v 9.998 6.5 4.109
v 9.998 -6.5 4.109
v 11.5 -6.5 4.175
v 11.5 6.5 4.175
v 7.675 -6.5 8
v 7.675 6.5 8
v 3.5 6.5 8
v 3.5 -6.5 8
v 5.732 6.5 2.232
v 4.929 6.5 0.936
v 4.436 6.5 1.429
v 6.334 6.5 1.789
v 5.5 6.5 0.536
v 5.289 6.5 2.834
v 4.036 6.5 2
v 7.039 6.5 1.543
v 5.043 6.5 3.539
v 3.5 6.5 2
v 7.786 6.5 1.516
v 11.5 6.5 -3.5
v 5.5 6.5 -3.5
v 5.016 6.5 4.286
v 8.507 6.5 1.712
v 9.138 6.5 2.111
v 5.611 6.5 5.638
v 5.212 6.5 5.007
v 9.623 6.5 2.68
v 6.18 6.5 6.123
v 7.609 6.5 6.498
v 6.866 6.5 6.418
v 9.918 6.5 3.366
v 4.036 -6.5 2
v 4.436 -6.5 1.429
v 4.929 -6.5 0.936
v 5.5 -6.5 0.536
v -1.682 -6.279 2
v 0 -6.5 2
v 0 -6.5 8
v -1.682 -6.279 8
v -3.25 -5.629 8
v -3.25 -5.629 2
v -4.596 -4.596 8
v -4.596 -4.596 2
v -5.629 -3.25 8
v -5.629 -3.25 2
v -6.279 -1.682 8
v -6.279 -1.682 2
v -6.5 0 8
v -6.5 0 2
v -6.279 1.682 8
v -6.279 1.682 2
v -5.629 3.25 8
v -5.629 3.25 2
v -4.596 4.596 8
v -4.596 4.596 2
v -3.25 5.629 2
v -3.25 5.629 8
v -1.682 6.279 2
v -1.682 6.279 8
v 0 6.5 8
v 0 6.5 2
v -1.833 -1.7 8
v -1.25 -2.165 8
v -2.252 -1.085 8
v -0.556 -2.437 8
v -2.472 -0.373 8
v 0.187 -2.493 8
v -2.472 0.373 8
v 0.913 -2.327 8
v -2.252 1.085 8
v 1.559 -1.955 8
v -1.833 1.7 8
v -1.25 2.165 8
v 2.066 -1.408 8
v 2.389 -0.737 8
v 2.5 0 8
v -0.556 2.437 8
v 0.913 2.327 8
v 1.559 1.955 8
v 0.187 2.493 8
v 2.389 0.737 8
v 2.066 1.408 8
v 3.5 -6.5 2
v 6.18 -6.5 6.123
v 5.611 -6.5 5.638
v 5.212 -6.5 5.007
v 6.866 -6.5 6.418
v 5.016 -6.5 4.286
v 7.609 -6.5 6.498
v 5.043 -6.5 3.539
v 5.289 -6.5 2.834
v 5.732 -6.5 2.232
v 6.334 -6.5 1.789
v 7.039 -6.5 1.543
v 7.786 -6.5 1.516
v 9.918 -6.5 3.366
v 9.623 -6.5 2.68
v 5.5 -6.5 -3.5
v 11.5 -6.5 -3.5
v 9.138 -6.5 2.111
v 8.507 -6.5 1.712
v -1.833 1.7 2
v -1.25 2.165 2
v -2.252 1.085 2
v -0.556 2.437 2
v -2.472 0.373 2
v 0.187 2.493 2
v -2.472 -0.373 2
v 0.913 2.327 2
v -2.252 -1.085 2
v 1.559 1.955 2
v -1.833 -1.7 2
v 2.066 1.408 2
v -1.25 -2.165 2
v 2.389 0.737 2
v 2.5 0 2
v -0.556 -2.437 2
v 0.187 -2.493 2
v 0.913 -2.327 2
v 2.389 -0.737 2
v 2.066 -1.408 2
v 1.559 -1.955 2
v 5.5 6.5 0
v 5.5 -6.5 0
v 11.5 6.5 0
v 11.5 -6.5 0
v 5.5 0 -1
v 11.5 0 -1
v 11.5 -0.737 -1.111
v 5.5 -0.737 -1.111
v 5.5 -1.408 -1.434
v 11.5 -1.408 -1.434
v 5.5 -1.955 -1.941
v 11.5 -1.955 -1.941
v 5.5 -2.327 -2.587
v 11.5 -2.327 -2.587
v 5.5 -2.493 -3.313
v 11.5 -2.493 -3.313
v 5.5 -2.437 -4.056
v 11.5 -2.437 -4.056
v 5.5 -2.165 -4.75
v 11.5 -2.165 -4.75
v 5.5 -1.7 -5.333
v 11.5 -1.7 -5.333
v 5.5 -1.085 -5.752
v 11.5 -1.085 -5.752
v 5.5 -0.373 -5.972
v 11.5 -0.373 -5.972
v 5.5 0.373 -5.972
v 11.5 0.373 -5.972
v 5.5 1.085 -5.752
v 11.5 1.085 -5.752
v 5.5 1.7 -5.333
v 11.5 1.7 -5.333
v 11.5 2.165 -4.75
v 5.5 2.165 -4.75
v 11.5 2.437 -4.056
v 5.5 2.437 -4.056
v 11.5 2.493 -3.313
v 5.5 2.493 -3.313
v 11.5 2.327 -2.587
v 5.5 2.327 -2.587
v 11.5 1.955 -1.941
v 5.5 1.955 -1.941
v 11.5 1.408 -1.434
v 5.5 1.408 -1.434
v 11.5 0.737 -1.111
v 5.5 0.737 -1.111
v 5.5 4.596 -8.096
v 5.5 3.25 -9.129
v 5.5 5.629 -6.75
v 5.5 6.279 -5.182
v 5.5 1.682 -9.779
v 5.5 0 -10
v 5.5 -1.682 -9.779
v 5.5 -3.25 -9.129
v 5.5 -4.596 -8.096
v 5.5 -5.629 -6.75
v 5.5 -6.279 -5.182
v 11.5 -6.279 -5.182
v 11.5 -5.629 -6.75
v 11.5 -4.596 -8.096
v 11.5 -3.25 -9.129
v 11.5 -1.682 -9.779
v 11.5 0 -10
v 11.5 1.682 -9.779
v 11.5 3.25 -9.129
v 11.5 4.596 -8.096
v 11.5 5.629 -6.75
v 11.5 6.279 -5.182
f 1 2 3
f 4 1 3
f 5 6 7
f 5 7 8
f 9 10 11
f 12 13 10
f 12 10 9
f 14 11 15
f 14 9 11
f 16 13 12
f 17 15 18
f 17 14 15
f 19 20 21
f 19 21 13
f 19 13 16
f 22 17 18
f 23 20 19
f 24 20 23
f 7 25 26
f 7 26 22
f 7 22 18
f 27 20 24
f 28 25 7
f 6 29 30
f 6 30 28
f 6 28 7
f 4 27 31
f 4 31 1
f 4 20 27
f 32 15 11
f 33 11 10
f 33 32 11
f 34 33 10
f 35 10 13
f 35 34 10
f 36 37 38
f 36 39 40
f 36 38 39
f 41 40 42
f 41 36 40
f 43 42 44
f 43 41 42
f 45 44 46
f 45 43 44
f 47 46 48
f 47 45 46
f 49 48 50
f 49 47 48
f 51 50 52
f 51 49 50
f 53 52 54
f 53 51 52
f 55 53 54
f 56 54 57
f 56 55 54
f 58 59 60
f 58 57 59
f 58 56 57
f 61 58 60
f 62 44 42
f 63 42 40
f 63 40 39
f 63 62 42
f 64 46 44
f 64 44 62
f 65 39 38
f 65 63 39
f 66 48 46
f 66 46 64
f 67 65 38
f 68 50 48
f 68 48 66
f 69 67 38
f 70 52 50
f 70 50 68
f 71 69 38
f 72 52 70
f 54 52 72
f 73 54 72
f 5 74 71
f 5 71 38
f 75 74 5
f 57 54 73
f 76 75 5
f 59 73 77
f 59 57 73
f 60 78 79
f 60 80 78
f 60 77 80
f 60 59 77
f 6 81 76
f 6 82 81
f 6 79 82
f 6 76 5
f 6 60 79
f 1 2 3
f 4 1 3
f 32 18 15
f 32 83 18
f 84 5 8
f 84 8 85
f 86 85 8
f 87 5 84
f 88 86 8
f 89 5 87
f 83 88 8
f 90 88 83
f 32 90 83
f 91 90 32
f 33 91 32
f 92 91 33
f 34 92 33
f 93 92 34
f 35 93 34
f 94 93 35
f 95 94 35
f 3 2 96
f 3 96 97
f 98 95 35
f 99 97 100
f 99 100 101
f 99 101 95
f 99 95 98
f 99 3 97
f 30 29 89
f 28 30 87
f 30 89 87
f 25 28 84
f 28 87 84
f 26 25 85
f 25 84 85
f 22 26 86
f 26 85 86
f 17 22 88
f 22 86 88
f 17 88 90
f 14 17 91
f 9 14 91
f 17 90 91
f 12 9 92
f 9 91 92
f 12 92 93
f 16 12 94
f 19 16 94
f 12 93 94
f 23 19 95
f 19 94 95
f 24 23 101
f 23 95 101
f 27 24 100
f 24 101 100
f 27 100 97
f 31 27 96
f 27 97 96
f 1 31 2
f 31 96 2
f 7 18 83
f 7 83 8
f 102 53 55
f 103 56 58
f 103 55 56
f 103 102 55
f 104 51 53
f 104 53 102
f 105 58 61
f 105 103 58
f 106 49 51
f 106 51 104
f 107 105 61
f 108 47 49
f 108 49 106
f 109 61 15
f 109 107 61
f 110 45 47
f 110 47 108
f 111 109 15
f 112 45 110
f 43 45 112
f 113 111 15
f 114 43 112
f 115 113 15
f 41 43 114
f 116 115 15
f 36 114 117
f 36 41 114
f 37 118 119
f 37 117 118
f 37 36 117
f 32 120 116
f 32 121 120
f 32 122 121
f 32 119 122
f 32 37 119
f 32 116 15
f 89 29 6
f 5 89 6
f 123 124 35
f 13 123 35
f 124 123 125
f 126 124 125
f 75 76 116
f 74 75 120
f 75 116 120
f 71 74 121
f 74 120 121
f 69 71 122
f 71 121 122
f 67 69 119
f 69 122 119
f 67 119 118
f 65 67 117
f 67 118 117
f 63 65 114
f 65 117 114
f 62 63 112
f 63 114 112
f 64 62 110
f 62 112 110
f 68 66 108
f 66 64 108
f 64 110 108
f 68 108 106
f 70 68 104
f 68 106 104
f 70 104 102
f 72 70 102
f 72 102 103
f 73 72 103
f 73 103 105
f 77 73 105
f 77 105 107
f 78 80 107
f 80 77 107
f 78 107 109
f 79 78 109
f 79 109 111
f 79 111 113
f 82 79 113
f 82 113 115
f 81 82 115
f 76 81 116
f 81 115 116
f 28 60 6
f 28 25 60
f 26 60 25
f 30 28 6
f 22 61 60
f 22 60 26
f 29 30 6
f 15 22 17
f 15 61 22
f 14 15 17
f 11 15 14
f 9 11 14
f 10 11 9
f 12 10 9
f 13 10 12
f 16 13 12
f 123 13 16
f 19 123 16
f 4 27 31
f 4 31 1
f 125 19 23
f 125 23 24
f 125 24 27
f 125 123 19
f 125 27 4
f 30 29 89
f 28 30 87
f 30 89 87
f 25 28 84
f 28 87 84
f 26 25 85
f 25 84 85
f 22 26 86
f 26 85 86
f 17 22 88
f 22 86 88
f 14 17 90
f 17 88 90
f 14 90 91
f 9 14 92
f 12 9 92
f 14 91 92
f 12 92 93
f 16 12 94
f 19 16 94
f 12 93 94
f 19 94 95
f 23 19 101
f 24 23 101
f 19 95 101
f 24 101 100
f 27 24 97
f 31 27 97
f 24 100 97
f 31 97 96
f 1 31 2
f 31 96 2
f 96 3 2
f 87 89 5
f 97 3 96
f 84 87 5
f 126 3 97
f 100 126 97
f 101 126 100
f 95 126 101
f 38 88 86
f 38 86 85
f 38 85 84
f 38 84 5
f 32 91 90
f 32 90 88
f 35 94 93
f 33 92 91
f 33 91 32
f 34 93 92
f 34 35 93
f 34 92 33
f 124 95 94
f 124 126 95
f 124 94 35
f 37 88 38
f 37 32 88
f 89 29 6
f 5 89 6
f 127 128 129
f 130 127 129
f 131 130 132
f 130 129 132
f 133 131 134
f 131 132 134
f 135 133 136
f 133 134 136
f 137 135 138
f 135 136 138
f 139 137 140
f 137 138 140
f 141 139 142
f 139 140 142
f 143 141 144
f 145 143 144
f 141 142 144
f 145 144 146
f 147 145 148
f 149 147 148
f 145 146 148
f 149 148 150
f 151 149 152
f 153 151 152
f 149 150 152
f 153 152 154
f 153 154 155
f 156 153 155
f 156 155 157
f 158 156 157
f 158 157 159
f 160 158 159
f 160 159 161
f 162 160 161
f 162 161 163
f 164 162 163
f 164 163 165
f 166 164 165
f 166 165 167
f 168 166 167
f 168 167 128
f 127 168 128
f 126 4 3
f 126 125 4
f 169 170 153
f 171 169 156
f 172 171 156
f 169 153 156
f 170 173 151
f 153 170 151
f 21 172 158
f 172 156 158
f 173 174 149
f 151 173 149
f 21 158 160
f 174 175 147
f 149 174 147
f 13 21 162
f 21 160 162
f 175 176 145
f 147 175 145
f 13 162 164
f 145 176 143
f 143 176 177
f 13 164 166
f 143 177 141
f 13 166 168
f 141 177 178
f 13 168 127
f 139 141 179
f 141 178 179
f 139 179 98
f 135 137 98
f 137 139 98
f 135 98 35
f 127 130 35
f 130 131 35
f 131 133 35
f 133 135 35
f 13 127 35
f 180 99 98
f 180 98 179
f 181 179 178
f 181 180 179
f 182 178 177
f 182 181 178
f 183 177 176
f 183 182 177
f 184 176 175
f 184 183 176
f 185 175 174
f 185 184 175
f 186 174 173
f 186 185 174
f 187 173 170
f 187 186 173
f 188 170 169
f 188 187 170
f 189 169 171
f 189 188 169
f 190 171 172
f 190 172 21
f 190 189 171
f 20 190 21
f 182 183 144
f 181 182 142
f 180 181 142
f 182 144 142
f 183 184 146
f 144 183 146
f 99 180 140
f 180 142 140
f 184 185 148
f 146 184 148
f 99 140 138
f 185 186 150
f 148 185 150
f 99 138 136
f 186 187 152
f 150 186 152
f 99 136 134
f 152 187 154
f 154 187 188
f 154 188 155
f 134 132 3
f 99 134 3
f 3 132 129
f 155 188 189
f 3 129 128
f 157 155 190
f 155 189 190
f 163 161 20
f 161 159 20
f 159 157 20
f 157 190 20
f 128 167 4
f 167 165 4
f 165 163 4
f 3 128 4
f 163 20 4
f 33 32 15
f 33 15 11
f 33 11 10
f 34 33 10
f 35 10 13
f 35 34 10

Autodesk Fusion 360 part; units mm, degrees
sketch "Esquisse1" plane through (0, 0, 0) normal (0, 0, 1) x (1, 0, 0)
  circle A0 centre (0, 0) radius 2.5
  circle A1 centre (0, 0) radius 6.5
  line L0 (0, 6.5) -> (11.5, 6.5)
  line L1 (11.5, 6.5) -> (11.5, -6.5)
  line L2 (11.5, -6.5) -> (0, -6.5)
  line L3 (0, -6.5) -> (0, 6.5) construction
  dimension "d1" = 5
  dimension "d2" = 4
  dimension "d3" = 13
  dimension "d4" = 11.5
extrude "Extrusion1" add sketch "Esquisse1" along normal blind 8 makes body 1
sketch "Esquisse3" plane through (0, -6.5, 0) normal (0, -1, 0) x (1, 0, 0)
  line L0 (0, 0) -> (11.5, 0)
  line L1 (11.5, 0) -> (11.5, 8)
  line L2 (11.5, 8) -> (0, 8)
  line L3 (0, 8) -> (0, 0)
  circle A0 centre (7.5, 4) radius 4
  dimension "d14" = 8
pattern_circular "Réseau C2" count 2 over 90 about axis through (7.5, -6.5, 4) along (0, -1, 0) of bodies 1 makes body 2
sketch "Esquisse2" plane through (0, -6.5, 0) normal (0, -1, 0) x (1, 0, 0)
  line L0 (0, 0) -> (11.5, 0)
  line L1 (11.5, 0) -> (11.5, 8)
  line L2 (11.5, 8) -> (0, 8)
  line L3 (0, 8) -> (0, 0)
  circle A0 centre (7.5, 4) radius 4
  circle A1 centre (7.5, 4) radius 2.5
  line L4 (0, 0) -> (-6.5, 0)
  line L5 (0, 0) -> (0, 8)
  line L6 (0, 8) -> (-6.5, 8)
  line L7 (0, 8) -> (0, 0)
  line L8 (-6.5, 8) -> (-6.5, 0)
  line L9 (7.5, 4) -> (11.5, 8) construction
  line L10 (7.5, 4) -> (7.6746, 8)
  line L11 (7.5, 4) -> (11.5, 4.1746)
  line L12 (7.5, 4) -> (0, 4) construction
  line L13 (7.5, 8) -> (-6.5, 8)
  line L14 (-6.5, 8) -> (-6.5, 2)
  line L15 (7.5, 2) -> (7.5, 8) construction
  line L16 (11.5, -3.5) -> (11.5, -10)
  line L17 (11.5, -3.5) -> (3.5, -3.5)
  line L18 (3.5, -3.5) -> (3.5, -10)
  line L19 (3.5, -3.5) -> (11.5, -3.5)
  line L20 (11.5, -3.5) -> (11.5, 8)
  line L21 (11.5, 8) -> (3.5, 8)
  line L22 (3.5, 8) -> (3.5, -3.5)
  line L23 (3.5, -3.5) -> (11.5, -3.5)
  line L24 (-6.5, 2) -> (3.5, 2)
  line L25 (3.5, -10) -> (11.5, -10)
  line L26 (11.5, 4.1746) -> (11.5, -10)
  line L27 (5.5, -10) -> (5.5, 0.5359)
  line L28 (3.5, 2) -> (4.0359, 2)
  dimension "d7" = 8
  dimension "d8" = 5
  dimension "d21" = 85
  dimension "d22" = 6
  dimension "d26" = 6
extrude "Extrusion4" cut sketch "Esquisse2" against normal through all contours L0 L3 L5 L7 L22 L24 | L3 L4 L5 L7 L8 L24 | L0 A0 L22 L27 L28 | L0 L17 L19 L22 L23 L27 | L17 L18 L19 L23 L25 L27 | L1 L2 A0 L10 L11 L20 L21 | A0 A1 L10 L11 | A1 L10 L11 | A1 L10 L11 picked at (10.9589, 4.4716) bodies 1 2
equation "d3 = d1 + 2 * d2"
equation "d4 = d3 / 2 + 5 mm"
